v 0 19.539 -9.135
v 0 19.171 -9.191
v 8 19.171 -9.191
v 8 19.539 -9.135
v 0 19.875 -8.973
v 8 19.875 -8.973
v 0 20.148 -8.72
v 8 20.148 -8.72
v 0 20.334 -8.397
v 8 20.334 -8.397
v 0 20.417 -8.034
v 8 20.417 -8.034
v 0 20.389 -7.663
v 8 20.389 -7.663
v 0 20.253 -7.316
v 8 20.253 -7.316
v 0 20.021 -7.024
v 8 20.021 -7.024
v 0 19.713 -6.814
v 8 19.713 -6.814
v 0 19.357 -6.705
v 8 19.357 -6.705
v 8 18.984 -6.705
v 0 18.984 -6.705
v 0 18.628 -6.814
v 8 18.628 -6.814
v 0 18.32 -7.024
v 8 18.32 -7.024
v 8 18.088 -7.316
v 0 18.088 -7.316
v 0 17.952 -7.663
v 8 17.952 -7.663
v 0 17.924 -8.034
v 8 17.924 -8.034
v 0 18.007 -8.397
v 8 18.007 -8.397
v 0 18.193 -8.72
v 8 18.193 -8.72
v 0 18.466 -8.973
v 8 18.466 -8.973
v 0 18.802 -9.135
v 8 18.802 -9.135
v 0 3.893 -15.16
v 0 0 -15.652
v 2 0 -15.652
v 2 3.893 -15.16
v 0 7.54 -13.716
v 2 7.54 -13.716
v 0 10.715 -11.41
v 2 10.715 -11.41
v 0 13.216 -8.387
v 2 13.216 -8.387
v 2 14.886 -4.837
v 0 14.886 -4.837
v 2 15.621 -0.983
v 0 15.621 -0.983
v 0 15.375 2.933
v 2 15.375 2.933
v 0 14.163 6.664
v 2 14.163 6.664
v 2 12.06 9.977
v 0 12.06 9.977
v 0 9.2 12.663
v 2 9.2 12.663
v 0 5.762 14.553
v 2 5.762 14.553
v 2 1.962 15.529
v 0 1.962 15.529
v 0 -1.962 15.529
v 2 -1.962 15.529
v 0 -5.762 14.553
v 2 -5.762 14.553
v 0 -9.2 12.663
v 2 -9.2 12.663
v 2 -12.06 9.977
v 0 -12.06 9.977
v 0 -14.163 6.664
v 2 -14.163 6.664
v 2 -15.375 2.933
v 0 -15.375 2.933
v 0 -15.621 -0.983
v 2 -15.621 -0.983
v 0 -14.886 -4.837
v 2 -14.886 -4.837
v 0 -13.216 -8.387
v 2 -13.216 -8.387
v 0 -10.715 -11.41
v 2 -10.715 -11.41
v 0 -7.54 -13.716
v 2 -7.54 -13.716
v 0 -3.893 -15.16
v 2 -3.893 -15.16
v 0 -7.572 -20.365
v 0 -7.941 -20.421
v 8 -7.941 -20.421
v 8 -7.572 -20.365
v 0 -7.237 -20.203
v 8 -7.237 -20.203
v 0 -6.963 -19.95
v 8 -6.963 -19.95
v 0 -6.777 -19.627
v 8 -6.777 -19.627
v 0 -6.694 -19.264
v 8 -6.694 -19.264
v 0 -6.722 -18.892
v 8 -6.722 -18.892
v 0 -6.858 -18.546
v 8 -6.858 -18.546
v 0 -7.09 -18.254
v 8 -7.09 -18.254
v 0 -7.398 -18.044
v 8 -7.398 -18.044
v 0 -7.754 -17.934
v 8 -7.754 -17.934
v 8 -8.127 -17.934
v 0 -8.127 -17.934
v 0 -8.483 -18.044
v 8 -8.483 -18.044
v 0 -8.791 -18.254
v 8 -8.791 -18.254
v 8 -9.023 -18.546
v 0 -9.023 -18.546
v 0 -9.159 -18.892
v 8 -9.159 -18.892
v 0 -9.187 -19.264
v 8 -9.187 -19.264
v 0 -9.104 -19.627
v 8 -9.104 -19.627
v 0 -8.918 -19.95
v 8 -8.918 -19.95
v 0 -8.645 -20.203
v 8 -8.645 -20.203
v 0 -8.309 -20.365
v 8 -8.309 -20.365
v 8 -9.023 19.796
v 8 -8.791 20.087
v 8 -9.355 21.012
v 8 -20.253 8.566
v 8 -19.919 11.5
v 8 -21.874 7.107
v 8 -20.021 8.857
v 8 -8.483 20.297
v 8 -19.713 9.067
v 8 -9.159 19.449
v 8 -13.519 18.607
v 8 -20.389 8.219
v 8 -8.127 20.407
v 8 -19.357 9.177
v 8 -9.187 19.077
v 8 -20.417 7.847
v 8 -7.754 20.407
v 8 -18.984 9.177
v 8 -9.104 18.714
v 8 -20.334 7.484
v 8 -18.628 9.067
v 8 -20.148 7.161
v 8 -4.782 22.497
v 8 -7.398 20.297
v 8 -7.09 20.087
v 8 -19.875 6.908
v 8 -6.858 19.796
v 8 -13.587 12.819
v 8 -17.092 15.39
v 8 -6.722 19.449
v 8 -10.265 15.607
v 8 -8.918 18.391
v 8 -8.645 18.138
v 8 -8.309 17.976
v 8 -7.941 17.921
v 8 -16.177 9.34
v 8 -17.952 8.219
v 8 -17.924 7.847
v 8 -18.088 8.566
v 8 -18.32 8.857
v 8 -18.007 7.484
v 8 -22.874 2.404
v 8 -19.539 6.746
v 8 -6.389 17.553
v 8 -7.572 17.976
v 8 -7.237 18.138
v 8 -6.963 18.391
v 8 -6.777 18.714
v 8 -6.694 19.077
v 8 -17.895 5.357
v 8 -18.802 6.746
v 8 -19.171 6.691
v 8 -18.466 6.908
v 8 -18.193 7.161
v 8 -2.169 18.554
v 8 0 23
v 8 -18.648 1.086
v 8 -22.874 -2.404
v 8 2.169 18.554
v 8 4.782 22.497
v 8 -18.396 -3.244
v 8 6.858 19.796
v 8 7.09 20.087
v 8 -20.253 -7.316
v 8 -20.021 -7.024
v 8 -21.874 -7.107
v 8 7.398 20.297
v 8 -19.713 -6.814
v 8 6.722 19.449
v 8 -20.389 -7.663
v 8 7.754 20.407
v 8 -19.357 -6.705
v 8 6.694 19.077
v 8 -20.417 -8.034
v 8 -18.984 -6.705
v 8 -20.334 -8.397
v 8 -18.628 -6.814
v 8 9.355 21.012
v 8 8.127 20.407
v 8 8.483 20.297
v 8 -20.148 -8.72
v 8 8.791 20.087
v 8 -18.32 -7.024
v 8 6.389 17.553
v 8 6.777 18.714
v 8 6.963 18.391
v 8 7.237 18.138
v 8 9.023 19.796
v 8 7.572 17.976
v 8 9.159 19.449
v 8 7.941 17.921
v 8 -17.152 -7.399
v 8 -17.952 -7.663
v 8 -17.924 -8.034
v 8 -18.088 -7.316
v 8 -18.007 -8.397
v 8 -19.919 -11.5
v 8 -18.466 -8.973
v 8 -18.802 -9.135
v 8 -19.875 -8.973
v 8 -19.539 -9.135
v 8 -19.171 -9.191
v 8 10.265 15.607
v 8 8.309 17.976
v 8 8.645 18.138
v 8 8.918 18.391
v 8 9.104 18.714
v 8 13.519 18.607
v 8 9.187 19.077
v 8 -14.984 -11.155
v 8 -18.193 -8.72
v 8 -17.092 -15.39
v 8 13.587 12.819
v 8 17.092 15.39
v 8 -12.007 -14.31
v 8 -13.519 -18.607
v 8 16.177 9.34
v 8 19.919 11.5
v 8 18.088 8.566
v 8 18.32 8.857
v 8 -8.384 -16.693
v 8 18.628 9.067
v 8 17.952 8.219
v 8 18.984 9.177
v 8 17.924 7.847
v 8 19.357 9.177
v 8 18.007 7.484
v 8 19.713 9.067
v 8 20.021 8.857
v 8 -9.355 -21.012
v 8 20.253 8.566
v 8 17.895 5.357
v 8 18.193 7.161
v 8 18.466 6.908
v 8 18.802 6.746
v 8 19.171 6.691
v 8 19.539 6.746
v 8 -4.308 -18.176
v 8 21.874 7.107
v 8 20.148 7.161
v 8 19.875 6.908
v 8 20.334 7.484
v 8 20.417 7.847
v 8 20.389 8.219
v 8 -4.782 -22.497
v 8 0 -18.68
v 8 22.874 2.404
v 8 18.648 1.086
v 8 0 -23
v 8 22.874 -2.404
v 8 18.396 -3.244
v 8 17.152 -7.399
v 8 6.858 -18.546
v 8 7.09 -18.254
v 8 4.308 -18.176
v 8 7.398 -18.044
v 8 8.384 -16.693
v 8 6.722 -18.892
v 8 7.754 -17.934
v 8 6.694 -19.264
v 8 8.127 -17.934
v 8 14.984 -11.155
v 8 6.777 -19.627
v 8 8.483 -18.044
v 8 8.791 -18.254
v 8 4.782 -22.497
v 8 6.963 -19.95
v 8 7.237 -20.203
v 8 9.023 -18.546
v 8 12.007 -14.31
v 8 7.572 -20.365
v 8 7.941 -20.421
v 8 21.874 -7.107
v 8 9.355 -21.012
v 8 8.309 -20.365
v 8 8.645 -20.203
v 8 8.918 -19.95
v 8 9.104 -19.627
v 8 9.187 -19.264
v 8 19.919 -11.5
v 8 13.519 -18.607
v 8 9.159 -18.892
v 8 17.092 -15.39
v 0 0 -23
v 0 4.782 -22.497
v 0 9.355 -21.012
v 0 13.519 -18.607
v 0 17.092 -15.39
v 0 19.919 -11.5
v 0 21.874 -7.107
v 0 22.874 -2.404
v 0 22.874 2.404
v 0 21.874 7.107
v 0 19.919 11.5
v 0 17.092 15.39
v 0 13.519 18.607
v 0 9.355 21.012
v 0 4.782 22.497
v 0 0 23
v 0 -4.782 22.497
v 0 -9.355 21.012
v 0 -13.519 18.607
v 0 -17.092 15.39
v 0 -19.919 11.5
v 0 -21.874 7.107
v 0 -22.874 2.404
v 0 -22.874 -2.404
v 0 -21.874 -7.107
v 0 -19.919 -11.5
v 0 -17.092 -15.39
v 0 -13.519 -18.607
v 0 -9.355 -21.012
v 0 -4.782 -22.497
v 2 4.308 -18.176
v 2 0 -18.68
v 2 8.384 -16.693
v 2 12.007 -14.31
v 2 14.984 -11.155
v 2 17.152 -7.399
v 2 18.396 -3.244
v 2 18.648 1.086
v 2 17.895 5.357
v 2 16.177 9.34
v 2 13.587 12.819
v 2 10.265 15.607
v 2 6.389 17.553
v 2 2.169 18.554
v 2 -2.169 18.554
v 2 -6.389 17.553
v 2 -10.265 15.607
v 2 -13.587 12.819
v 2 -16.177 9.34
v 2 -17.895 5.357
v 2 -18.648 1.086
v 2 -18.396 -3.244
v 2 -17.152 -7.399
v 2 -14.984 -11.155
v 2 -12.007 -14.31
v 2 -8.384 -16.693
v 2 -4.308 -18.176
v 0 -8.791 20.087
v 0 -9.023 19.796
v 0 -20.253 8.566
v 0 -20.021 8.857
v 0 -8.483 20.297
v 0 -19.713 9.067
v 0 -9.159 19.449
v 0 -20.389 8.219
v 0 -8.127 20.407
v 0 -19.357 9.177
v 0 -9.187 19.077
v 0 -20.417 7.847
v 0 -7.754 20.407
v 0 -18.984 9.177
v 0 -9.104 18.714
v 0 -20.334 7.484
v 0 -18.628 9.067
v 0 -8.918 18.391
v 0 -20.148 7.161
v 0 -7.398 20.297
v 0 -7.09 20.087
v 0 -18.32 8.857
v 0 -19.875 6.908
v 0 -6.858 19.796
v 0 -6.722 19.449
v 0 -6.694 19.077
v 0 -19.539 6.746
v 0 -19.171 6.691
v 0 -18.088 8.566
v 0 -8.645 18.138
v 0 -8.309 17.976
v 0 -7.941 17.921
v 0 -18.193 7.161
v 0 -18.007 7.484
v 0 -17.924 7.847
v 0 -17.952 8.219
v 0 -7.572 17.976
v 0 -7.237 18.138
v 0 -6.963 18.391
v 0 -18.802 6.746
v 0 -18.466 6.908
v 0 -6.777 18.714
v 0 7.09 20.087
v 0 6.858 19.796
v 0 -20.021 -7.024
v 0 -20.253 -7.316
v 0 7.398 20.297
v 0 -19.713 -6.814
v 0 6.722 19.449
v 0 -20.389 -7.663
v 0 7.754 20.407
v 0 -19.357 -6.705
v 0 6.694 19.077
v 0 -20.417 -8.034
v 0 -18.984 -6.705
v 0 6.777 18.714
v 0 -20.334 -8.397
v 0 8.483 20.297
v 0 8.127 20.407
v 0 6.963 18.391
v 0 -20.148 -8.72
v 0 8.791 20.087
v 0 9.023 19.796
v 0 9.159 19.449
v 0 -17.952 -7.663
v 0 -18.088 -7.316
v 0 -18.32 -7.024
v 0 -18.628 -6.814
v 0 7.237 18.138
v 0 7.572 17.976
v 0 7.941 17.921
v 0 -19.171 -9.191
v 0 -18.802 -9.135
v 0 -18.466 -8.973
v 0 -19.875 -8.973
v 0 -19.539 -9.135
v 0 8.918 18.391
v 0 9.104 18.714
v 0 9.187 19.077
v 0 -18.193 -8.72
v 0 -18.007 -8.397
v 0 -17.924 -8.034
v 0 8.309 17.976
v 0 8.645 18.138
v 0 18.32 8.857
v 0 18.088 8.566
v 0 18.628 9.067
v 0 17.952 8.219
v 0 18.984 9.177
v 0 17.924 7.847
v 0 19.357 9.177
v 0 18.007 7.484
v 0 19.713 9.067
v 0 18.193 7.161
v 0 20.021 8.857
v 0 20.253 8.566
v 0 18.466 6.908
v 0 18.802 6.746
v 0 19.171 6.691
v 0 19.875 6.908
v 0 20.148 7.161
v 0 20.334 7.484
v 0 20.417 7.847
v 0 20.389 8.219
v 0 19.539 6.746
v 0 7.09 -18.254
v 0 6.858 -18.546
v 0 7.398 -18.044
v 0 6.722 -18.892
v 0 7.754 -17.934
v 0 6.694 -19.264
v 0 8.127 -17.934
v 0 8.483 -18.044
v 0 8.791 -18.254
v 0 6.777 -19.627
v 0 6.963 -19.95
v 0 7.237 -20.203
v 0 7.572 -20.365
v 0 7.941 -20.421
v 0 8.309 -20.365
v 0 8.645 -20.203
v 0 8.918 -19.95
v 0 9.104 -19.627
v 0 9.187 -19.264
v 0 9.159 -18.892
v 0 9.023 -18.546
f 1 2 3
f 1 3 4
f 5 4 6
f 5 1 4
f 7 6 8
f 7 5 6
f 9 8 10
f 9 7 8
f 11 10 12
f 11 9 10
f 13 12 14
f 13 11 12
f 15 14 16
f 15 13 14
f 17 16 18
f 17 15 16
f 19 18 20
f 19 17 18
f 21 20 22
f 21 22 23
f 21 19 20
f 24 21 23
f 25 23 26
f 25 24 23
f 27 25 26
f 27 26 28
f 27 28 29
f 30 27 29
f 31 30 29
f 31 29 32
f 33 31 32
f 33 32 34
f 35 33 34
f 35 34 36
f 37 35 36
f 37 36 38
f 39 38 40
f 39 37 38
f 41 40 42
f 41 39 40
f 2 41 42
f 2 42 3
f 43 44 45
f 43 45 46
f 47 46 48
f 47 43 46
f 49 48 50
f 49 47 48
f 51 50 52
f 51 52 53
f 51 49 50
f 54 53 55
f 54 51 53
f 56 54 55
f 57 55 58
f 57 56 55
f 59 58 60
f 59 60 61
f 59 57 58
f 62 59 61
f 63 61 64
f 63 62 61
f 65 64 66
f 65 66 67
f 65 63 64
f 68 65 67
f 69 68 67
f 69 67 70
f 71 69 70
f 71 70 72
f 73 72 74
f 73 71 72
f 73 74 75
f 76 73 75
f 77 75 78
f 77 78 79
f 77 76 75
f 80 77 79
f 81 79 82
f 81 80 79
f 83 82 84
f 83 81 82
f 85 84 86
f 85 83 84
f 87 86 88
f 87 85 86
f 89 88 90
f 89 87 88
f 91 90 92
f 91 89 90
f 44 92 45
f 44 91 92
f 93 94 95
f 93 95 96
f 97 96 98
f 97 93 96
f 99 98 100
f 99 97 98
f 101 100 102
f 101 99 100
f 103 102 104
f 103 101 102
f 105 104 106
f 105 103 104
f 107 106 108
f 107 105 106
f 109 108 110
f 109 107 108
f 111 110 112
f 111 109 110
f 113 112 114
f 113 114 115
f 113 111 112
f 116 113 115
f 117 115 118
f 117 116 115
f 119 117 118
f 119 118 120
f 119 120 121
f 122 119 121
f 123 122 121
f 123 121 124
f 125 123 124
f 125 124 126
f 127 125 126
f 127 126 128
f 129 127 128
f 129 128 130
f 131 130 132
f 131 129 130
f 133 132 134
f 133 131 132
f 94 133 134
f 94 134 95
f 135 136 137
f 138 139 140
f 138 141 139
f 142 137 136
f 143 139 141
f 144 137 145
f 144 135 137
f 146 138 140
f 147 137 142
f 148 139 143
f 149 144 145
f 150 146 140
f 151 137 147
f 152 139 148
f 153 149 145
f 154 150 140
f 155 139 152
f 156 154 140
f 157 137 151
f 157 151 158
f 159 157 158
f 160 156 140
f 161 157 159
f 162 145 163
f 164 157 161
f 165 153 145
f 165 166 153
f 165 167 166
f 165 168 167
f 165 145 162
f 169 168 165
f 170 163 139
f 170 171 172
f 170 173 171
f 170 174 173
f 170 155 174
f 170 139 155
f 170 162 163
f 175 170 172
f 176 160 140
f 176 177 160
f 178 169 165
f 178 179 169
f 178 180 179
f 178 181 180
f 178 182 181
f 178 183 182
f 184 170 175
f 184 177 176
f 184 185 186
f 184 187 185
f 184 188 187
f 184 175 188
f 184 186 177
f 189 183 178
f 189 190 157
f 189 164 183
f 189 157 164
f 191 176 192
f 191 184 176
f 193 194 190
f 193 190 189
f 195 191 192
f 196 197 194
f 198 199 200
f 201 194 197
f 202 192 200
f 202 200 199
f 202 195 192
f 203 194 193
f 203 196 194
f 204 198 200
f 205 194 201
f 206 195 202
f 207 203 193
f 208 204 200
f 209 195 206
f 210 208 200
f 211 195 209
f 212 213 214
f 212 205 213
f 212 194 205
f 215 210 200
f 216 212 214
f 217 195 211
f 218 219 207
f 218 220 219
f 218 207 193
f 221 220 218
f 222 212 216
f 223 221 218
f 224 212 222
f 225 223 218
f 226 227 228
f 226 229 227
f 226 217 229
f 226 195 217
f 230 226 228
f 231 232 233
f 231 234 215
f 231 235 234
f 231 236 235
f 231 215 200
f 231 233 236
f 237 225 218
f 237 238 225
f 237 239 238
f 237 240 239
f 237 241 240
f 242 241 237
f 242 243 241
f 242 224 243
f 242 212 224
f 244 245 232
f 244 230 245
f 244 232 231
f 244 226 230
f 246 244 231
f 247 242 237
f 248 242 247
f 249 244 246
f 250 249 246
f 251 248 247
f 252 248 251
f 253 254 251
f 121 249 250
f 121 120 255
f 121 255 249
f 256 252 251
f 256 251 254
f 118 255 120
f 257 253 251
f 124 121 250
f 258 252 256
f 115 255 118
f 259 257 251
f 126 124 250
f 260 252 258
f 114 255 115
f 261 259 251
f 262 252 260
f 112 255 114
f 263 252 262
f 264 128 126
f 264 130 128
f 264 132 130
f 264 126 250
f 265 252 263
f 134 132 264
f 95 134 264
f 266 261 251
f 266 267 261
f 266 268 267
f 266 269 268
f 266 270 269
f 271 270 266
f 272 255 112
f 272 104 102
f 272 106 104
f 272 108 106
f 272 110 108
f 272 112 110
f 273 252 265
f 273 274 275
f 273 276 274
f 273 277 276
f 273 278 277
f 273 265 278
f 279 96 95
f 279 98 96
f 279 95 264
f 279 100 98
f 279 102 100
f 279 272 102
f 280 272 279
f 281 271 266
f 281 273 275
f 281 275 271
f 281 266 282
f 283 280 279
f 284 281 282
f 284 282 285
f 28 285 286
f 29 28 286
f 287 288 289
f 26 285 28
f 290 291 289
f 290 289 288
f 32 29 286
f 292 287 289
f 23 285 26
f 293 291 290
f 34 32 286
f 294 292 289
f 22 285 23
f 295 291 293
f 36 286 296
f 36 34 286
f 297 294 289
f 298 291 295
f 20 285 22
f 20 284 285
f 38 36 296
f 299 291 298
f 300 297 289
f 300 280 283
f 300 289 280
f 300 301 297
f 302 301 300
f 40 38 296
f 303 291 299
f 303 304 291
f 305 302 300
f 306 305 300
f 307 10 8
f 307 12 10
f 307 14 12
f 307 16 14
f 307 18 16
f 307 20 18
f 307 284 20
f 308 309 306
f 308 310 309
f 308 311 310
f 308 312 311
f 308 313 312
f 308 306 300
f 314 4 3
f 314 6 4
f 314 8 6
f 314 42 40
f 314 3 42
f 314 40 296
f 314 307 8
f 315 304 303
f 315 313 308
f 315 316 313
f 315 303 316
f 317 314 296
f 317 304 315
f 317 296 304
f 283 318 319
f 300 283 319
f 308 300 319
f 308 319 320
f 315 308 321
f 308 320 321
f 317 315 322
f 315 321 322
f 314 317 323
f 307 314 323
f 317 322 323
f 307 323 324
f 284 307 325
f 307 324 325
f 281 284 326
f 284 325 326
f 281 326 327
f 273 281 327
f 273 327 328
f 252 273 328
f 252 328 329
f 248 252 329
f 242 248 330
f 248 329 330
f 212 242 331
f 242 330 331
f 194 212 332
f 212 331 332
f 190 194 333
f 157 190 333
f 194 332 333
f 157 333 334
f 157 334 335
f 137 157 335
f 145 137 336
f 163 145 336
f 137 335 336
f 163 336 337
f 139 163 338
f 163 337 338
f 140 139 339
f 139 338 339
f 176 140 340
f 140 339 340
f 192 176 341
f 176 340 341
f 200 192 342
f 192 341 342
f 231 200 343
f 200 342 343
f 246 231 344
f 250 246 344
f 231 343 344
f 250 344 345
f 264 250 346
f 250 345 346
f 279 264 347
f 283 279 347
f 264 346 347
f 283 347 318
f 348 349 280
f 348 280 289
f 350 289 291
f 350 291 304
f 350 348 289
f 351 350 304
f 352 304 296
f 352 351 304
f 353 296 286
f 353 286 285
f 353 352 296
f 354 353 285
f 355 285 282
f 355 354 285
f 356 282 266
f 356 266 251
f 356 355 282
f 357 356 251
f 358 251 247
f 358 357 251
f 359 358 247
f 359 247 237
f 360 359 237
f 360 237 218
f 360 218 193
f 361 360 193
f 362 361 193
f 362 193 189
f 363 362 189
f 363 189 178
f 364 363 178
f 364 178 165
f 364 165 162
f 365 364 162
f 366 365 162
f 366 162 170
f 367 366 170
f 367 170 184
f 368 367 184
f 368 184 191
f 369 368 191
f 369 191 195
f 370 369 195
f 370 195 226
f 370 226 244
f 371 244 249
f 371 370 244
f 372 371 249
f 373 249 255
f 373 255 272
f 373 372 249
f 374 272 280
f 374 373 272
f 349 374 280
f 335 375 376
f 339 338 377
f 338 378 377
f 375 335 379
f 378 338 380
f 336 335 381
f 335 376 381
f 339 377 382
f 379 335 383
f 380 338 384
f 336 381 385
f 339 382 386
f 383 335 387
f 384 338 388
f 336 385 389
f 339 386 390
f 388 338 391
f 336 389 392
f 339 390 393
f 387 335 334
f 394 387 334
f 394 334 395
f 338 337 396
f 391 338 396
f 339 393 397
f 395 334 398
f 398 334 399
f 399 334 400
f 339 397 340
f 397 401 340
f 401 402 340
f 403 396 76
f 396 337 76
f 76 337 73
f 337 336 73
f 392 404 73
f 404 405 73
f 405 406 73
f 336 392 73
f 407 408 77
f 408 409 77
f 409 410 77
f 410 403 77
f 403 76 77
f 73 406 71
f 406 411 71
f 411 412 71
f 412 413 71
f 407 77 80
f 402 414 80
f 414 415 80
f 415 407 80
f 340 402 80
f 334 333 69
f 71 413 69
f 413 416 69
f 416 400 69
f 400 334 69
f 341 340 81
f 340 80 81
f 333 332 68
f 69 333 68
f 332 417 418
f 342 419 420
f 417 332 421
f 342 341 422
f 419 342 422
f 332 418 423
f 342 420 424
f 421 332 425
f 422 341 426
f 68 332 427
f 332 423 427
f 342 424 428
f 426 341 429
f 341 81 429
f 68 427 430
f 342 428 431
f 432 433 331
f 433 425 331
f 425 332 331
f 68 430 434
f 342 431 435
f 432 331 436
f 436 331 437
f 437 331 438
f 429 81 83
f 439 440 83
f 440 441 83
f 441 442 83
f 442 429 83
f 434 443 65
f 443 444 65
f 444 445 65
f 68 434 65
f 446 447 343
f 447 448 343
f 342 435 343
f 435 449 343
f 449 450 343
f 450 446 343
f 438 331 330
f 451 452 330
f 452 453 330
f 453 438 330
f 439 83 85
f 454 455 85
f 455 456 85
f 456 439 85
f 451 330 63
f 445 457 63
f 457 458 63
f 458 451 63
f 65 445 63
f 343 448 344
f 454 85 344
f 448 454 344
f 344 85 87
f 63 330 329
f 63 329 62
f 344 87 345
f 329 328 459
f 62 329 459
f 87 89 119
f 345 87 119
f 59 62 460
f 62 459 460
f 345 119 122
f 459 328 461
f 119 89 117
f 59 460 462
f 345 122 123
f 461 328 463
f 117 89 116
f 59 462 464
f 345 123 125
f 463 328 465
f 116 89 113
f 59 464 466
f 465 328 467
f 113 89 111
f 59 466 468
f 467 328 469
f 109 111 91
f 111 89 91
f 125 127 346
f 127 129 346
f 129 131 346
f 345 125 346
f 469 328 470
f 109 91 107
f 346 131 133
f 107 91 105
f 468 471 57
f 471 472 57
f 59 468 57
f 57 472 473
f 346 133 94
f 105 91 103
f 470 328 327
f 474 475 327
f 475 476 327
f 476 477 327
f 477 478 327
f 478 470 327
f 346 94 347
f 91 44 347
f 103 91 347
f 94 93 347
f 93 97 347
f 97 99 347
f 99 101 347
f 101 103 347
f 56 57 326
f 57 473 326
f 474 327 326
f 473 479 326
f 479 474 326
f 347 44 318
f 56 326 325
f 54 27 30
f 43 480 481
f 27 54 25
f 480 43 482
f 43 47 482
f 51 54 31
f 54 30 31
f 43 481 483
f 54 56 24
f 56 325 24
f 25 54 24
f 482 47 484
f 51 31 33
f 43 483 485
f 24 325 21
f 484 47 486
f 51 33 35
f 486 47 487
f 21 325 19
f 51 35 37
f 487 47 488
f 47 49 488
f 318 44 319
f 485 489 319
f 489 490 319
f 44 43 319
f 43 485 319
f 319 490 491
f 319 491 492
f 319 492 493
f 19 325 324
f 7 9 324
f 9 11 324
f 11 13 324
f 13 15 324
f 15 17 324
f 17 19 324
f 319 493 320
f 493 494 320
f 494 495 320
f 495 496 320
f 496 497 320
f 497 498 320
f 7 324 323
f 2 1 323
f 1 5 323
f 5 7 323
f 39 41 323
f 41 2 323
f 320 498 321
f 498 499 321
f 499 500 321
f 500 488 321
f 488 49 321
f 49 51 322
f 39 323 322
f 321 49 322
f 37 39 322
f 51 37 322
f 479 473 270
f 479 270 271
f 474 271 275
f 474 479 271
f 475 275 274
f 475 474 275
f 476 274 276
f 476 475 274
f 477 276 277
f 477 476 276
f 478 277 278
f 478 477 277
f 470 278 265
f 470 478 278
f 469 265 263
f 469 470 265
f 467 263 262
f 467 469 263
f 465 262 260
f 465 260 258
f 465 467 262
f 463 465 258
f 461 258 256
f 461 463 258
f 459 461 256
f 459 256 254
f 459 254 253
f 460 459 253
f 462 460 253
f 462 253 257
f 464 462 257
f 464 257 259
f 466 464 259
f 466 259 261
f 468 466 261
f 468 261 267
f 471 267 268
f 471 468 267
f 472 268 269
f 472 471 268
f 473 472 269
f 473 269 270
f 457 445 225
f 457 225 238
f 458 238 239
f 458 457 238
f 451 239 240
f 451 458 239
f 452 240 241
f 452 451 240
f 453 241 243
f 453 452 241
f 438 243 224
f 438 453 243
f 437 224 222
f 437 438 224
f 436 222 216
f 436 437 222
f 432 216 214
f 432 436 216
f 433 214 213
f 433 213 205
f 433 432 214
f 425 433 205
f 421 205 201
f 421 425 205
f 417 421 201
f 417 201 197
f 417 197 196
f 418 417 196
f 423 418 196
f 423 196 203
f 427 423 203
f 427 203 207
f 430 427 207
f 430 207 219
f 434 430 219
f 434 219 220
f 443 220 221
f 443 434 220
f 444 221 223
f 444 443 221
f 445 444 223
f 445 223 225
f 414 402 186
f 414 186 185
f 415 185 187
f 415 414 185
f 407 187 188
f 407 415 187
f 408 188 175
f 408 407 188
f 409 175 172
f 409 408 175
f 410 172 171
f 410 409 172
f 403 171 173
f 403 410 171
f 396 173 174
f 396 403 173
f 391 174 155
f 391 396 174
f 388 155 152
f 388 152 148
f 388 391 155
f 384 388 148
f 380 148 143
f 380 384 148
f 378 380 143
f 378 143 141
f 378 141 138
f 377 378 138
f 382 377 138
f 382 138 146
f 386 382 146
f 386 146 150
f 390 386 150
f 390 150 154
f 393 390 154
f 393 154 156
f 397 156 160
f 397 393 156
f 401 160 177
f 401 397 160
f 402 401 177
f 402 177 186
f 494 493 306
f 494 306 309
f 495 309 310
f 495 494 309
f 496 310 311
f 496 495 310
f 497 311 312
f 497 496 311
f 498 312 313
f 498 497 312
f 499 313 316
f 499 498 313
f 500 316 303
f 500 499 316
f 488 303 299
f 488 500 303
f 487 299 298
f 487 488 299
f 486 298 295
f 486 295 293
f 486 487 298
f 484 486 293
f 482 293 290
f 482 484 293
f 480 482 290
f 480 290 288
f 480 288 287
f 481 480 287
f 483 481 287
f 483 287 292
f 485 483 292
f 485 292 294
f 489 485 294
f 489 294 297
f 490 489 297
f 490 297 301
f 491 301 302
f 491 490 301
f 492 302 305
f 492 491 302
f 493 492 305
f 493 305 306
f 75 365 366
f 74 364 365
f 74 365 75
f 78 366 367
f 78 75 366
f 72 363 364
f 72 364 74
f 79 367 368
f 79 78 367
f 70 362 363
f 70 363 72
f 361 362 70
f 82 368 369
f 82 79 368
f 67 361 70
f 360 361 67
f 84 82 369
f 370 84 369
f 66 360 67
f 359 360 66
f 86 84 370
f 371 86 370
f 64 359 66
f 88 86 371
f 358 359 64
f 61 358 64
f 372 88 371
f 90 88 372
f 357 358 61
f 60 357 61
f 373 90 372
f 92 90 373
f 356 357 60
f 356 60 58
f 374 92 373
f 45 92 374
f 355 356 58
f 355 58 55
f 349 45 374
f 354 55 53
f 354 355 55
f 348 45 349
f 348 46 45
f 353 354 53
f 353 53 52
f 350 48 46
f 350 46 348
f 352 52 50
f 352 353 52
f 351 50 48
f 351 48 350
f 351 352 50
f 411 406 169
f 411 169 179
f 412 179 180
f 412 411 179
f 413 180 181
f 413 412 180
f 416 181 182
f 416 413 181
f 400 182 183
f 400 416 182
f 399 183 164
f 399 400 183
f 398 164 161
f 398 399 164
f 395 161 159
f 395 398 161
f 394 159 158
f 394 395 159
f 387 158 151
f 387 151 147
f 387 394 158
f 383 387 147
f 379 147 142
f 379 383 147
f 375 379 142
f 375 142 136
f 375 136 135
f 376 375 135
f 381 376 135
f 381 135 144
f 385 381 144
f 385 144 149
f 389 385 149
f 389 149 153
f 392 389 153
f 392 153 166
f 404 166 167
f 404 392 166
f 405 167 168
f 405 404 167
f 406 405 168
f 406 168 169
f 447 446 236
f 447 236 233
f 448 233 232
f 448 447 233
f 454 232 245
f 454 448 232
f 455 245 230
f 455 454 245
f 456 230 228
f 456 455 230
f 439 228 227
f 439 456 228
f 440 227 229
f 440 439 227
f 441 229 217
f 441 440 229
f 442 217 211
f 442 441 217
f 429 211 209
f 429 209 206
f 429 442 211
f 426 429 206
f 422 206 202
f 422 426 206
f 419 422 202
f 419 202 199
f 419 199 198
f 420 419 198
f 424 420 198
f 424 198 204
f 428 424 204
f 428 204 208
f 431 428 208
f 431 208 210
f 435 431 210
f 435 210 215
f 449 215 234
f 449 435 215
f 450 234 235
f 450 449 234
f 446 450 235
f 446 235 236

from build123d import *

# Parameters (mm, degrees)
SKETCH_1_R      = 18.68
SKETCH_1_R_2    = 15.652173913
EXTRUDE_2_DEPTH = 2
SKETCH_1_4_R    = 23
SKETCH_1_4_R_2  = 1.25
SKETCH_1_4_R_3  = 18.68
EXTRUDE_3_DEPTH = 8


with BuildPart() as part:
    # 草图1 → 凸台-拉伸2 (new body)
    with BuildSketch(Plane(origin=(0, 0, 0), x_dir=(0, 0, -1), z_dir=(1, 0, 0))):
        Circle(SKETCH_1_R)
        Circle(SKETCH_1_R_2, mode=Mode.SUBTRACT)
    extrude(amount=EXTRUDE_2_DEPTH)

    # 草图1<4> → 凸台-拉伸3 (add)
    with BuildSketch(Plane(origin=(0, 0, 0), x_dir=(0, 0, -1), z_dir=(1, 0, 0))):
        Circle(SKETCH_1_4_R)
        with Locations((-7.940681222, 19.1705003)):
            Circle(SKETCH_1_4_R_2, mode=Mode.SUBTRACT)
        with Locations((-19.1705003, 7.940681222)):
            Circle(SKETCH_1_4_R_2, mode=Mode.SUBTRACT)
        with Locations((-19.1705003, -7.940681222)):
            Circle(SKETCH_1_4_R_2, mode=Mode.SUBTRACT)
        with Locations((-7.940681222, -19.1705003)):
            Circle(SKETCH_1_4_R_2, mode=Mode.SUBTRACT)
        with Locations((7.940681222, -19.1705003)):
            Circle(SKETCH_1_4_R_2, mode=Mode.SUBTRACT)
        with Locations((19.1705003, -7.940681222)):
            Circle(SKETCH_1_4_R_2, mode=Mode.SUBTRACT)
        with Locations((19.1705003, 7.940681222)):
            Circle(SKETCH_1_4_R_2, mode=Mode.SUBTRACT)
        with Locations((7.940681222, 19.1705003)):
            Circle(SKETCH_1_4_R_2, mode=Mode.SUBTRACT)
        Circle(SKETCH_1_4_R_3, mode=Mode.SUBTRACT)
    extrude(amount=EXTRUDE_3_DEPTH)


solid = part.part
